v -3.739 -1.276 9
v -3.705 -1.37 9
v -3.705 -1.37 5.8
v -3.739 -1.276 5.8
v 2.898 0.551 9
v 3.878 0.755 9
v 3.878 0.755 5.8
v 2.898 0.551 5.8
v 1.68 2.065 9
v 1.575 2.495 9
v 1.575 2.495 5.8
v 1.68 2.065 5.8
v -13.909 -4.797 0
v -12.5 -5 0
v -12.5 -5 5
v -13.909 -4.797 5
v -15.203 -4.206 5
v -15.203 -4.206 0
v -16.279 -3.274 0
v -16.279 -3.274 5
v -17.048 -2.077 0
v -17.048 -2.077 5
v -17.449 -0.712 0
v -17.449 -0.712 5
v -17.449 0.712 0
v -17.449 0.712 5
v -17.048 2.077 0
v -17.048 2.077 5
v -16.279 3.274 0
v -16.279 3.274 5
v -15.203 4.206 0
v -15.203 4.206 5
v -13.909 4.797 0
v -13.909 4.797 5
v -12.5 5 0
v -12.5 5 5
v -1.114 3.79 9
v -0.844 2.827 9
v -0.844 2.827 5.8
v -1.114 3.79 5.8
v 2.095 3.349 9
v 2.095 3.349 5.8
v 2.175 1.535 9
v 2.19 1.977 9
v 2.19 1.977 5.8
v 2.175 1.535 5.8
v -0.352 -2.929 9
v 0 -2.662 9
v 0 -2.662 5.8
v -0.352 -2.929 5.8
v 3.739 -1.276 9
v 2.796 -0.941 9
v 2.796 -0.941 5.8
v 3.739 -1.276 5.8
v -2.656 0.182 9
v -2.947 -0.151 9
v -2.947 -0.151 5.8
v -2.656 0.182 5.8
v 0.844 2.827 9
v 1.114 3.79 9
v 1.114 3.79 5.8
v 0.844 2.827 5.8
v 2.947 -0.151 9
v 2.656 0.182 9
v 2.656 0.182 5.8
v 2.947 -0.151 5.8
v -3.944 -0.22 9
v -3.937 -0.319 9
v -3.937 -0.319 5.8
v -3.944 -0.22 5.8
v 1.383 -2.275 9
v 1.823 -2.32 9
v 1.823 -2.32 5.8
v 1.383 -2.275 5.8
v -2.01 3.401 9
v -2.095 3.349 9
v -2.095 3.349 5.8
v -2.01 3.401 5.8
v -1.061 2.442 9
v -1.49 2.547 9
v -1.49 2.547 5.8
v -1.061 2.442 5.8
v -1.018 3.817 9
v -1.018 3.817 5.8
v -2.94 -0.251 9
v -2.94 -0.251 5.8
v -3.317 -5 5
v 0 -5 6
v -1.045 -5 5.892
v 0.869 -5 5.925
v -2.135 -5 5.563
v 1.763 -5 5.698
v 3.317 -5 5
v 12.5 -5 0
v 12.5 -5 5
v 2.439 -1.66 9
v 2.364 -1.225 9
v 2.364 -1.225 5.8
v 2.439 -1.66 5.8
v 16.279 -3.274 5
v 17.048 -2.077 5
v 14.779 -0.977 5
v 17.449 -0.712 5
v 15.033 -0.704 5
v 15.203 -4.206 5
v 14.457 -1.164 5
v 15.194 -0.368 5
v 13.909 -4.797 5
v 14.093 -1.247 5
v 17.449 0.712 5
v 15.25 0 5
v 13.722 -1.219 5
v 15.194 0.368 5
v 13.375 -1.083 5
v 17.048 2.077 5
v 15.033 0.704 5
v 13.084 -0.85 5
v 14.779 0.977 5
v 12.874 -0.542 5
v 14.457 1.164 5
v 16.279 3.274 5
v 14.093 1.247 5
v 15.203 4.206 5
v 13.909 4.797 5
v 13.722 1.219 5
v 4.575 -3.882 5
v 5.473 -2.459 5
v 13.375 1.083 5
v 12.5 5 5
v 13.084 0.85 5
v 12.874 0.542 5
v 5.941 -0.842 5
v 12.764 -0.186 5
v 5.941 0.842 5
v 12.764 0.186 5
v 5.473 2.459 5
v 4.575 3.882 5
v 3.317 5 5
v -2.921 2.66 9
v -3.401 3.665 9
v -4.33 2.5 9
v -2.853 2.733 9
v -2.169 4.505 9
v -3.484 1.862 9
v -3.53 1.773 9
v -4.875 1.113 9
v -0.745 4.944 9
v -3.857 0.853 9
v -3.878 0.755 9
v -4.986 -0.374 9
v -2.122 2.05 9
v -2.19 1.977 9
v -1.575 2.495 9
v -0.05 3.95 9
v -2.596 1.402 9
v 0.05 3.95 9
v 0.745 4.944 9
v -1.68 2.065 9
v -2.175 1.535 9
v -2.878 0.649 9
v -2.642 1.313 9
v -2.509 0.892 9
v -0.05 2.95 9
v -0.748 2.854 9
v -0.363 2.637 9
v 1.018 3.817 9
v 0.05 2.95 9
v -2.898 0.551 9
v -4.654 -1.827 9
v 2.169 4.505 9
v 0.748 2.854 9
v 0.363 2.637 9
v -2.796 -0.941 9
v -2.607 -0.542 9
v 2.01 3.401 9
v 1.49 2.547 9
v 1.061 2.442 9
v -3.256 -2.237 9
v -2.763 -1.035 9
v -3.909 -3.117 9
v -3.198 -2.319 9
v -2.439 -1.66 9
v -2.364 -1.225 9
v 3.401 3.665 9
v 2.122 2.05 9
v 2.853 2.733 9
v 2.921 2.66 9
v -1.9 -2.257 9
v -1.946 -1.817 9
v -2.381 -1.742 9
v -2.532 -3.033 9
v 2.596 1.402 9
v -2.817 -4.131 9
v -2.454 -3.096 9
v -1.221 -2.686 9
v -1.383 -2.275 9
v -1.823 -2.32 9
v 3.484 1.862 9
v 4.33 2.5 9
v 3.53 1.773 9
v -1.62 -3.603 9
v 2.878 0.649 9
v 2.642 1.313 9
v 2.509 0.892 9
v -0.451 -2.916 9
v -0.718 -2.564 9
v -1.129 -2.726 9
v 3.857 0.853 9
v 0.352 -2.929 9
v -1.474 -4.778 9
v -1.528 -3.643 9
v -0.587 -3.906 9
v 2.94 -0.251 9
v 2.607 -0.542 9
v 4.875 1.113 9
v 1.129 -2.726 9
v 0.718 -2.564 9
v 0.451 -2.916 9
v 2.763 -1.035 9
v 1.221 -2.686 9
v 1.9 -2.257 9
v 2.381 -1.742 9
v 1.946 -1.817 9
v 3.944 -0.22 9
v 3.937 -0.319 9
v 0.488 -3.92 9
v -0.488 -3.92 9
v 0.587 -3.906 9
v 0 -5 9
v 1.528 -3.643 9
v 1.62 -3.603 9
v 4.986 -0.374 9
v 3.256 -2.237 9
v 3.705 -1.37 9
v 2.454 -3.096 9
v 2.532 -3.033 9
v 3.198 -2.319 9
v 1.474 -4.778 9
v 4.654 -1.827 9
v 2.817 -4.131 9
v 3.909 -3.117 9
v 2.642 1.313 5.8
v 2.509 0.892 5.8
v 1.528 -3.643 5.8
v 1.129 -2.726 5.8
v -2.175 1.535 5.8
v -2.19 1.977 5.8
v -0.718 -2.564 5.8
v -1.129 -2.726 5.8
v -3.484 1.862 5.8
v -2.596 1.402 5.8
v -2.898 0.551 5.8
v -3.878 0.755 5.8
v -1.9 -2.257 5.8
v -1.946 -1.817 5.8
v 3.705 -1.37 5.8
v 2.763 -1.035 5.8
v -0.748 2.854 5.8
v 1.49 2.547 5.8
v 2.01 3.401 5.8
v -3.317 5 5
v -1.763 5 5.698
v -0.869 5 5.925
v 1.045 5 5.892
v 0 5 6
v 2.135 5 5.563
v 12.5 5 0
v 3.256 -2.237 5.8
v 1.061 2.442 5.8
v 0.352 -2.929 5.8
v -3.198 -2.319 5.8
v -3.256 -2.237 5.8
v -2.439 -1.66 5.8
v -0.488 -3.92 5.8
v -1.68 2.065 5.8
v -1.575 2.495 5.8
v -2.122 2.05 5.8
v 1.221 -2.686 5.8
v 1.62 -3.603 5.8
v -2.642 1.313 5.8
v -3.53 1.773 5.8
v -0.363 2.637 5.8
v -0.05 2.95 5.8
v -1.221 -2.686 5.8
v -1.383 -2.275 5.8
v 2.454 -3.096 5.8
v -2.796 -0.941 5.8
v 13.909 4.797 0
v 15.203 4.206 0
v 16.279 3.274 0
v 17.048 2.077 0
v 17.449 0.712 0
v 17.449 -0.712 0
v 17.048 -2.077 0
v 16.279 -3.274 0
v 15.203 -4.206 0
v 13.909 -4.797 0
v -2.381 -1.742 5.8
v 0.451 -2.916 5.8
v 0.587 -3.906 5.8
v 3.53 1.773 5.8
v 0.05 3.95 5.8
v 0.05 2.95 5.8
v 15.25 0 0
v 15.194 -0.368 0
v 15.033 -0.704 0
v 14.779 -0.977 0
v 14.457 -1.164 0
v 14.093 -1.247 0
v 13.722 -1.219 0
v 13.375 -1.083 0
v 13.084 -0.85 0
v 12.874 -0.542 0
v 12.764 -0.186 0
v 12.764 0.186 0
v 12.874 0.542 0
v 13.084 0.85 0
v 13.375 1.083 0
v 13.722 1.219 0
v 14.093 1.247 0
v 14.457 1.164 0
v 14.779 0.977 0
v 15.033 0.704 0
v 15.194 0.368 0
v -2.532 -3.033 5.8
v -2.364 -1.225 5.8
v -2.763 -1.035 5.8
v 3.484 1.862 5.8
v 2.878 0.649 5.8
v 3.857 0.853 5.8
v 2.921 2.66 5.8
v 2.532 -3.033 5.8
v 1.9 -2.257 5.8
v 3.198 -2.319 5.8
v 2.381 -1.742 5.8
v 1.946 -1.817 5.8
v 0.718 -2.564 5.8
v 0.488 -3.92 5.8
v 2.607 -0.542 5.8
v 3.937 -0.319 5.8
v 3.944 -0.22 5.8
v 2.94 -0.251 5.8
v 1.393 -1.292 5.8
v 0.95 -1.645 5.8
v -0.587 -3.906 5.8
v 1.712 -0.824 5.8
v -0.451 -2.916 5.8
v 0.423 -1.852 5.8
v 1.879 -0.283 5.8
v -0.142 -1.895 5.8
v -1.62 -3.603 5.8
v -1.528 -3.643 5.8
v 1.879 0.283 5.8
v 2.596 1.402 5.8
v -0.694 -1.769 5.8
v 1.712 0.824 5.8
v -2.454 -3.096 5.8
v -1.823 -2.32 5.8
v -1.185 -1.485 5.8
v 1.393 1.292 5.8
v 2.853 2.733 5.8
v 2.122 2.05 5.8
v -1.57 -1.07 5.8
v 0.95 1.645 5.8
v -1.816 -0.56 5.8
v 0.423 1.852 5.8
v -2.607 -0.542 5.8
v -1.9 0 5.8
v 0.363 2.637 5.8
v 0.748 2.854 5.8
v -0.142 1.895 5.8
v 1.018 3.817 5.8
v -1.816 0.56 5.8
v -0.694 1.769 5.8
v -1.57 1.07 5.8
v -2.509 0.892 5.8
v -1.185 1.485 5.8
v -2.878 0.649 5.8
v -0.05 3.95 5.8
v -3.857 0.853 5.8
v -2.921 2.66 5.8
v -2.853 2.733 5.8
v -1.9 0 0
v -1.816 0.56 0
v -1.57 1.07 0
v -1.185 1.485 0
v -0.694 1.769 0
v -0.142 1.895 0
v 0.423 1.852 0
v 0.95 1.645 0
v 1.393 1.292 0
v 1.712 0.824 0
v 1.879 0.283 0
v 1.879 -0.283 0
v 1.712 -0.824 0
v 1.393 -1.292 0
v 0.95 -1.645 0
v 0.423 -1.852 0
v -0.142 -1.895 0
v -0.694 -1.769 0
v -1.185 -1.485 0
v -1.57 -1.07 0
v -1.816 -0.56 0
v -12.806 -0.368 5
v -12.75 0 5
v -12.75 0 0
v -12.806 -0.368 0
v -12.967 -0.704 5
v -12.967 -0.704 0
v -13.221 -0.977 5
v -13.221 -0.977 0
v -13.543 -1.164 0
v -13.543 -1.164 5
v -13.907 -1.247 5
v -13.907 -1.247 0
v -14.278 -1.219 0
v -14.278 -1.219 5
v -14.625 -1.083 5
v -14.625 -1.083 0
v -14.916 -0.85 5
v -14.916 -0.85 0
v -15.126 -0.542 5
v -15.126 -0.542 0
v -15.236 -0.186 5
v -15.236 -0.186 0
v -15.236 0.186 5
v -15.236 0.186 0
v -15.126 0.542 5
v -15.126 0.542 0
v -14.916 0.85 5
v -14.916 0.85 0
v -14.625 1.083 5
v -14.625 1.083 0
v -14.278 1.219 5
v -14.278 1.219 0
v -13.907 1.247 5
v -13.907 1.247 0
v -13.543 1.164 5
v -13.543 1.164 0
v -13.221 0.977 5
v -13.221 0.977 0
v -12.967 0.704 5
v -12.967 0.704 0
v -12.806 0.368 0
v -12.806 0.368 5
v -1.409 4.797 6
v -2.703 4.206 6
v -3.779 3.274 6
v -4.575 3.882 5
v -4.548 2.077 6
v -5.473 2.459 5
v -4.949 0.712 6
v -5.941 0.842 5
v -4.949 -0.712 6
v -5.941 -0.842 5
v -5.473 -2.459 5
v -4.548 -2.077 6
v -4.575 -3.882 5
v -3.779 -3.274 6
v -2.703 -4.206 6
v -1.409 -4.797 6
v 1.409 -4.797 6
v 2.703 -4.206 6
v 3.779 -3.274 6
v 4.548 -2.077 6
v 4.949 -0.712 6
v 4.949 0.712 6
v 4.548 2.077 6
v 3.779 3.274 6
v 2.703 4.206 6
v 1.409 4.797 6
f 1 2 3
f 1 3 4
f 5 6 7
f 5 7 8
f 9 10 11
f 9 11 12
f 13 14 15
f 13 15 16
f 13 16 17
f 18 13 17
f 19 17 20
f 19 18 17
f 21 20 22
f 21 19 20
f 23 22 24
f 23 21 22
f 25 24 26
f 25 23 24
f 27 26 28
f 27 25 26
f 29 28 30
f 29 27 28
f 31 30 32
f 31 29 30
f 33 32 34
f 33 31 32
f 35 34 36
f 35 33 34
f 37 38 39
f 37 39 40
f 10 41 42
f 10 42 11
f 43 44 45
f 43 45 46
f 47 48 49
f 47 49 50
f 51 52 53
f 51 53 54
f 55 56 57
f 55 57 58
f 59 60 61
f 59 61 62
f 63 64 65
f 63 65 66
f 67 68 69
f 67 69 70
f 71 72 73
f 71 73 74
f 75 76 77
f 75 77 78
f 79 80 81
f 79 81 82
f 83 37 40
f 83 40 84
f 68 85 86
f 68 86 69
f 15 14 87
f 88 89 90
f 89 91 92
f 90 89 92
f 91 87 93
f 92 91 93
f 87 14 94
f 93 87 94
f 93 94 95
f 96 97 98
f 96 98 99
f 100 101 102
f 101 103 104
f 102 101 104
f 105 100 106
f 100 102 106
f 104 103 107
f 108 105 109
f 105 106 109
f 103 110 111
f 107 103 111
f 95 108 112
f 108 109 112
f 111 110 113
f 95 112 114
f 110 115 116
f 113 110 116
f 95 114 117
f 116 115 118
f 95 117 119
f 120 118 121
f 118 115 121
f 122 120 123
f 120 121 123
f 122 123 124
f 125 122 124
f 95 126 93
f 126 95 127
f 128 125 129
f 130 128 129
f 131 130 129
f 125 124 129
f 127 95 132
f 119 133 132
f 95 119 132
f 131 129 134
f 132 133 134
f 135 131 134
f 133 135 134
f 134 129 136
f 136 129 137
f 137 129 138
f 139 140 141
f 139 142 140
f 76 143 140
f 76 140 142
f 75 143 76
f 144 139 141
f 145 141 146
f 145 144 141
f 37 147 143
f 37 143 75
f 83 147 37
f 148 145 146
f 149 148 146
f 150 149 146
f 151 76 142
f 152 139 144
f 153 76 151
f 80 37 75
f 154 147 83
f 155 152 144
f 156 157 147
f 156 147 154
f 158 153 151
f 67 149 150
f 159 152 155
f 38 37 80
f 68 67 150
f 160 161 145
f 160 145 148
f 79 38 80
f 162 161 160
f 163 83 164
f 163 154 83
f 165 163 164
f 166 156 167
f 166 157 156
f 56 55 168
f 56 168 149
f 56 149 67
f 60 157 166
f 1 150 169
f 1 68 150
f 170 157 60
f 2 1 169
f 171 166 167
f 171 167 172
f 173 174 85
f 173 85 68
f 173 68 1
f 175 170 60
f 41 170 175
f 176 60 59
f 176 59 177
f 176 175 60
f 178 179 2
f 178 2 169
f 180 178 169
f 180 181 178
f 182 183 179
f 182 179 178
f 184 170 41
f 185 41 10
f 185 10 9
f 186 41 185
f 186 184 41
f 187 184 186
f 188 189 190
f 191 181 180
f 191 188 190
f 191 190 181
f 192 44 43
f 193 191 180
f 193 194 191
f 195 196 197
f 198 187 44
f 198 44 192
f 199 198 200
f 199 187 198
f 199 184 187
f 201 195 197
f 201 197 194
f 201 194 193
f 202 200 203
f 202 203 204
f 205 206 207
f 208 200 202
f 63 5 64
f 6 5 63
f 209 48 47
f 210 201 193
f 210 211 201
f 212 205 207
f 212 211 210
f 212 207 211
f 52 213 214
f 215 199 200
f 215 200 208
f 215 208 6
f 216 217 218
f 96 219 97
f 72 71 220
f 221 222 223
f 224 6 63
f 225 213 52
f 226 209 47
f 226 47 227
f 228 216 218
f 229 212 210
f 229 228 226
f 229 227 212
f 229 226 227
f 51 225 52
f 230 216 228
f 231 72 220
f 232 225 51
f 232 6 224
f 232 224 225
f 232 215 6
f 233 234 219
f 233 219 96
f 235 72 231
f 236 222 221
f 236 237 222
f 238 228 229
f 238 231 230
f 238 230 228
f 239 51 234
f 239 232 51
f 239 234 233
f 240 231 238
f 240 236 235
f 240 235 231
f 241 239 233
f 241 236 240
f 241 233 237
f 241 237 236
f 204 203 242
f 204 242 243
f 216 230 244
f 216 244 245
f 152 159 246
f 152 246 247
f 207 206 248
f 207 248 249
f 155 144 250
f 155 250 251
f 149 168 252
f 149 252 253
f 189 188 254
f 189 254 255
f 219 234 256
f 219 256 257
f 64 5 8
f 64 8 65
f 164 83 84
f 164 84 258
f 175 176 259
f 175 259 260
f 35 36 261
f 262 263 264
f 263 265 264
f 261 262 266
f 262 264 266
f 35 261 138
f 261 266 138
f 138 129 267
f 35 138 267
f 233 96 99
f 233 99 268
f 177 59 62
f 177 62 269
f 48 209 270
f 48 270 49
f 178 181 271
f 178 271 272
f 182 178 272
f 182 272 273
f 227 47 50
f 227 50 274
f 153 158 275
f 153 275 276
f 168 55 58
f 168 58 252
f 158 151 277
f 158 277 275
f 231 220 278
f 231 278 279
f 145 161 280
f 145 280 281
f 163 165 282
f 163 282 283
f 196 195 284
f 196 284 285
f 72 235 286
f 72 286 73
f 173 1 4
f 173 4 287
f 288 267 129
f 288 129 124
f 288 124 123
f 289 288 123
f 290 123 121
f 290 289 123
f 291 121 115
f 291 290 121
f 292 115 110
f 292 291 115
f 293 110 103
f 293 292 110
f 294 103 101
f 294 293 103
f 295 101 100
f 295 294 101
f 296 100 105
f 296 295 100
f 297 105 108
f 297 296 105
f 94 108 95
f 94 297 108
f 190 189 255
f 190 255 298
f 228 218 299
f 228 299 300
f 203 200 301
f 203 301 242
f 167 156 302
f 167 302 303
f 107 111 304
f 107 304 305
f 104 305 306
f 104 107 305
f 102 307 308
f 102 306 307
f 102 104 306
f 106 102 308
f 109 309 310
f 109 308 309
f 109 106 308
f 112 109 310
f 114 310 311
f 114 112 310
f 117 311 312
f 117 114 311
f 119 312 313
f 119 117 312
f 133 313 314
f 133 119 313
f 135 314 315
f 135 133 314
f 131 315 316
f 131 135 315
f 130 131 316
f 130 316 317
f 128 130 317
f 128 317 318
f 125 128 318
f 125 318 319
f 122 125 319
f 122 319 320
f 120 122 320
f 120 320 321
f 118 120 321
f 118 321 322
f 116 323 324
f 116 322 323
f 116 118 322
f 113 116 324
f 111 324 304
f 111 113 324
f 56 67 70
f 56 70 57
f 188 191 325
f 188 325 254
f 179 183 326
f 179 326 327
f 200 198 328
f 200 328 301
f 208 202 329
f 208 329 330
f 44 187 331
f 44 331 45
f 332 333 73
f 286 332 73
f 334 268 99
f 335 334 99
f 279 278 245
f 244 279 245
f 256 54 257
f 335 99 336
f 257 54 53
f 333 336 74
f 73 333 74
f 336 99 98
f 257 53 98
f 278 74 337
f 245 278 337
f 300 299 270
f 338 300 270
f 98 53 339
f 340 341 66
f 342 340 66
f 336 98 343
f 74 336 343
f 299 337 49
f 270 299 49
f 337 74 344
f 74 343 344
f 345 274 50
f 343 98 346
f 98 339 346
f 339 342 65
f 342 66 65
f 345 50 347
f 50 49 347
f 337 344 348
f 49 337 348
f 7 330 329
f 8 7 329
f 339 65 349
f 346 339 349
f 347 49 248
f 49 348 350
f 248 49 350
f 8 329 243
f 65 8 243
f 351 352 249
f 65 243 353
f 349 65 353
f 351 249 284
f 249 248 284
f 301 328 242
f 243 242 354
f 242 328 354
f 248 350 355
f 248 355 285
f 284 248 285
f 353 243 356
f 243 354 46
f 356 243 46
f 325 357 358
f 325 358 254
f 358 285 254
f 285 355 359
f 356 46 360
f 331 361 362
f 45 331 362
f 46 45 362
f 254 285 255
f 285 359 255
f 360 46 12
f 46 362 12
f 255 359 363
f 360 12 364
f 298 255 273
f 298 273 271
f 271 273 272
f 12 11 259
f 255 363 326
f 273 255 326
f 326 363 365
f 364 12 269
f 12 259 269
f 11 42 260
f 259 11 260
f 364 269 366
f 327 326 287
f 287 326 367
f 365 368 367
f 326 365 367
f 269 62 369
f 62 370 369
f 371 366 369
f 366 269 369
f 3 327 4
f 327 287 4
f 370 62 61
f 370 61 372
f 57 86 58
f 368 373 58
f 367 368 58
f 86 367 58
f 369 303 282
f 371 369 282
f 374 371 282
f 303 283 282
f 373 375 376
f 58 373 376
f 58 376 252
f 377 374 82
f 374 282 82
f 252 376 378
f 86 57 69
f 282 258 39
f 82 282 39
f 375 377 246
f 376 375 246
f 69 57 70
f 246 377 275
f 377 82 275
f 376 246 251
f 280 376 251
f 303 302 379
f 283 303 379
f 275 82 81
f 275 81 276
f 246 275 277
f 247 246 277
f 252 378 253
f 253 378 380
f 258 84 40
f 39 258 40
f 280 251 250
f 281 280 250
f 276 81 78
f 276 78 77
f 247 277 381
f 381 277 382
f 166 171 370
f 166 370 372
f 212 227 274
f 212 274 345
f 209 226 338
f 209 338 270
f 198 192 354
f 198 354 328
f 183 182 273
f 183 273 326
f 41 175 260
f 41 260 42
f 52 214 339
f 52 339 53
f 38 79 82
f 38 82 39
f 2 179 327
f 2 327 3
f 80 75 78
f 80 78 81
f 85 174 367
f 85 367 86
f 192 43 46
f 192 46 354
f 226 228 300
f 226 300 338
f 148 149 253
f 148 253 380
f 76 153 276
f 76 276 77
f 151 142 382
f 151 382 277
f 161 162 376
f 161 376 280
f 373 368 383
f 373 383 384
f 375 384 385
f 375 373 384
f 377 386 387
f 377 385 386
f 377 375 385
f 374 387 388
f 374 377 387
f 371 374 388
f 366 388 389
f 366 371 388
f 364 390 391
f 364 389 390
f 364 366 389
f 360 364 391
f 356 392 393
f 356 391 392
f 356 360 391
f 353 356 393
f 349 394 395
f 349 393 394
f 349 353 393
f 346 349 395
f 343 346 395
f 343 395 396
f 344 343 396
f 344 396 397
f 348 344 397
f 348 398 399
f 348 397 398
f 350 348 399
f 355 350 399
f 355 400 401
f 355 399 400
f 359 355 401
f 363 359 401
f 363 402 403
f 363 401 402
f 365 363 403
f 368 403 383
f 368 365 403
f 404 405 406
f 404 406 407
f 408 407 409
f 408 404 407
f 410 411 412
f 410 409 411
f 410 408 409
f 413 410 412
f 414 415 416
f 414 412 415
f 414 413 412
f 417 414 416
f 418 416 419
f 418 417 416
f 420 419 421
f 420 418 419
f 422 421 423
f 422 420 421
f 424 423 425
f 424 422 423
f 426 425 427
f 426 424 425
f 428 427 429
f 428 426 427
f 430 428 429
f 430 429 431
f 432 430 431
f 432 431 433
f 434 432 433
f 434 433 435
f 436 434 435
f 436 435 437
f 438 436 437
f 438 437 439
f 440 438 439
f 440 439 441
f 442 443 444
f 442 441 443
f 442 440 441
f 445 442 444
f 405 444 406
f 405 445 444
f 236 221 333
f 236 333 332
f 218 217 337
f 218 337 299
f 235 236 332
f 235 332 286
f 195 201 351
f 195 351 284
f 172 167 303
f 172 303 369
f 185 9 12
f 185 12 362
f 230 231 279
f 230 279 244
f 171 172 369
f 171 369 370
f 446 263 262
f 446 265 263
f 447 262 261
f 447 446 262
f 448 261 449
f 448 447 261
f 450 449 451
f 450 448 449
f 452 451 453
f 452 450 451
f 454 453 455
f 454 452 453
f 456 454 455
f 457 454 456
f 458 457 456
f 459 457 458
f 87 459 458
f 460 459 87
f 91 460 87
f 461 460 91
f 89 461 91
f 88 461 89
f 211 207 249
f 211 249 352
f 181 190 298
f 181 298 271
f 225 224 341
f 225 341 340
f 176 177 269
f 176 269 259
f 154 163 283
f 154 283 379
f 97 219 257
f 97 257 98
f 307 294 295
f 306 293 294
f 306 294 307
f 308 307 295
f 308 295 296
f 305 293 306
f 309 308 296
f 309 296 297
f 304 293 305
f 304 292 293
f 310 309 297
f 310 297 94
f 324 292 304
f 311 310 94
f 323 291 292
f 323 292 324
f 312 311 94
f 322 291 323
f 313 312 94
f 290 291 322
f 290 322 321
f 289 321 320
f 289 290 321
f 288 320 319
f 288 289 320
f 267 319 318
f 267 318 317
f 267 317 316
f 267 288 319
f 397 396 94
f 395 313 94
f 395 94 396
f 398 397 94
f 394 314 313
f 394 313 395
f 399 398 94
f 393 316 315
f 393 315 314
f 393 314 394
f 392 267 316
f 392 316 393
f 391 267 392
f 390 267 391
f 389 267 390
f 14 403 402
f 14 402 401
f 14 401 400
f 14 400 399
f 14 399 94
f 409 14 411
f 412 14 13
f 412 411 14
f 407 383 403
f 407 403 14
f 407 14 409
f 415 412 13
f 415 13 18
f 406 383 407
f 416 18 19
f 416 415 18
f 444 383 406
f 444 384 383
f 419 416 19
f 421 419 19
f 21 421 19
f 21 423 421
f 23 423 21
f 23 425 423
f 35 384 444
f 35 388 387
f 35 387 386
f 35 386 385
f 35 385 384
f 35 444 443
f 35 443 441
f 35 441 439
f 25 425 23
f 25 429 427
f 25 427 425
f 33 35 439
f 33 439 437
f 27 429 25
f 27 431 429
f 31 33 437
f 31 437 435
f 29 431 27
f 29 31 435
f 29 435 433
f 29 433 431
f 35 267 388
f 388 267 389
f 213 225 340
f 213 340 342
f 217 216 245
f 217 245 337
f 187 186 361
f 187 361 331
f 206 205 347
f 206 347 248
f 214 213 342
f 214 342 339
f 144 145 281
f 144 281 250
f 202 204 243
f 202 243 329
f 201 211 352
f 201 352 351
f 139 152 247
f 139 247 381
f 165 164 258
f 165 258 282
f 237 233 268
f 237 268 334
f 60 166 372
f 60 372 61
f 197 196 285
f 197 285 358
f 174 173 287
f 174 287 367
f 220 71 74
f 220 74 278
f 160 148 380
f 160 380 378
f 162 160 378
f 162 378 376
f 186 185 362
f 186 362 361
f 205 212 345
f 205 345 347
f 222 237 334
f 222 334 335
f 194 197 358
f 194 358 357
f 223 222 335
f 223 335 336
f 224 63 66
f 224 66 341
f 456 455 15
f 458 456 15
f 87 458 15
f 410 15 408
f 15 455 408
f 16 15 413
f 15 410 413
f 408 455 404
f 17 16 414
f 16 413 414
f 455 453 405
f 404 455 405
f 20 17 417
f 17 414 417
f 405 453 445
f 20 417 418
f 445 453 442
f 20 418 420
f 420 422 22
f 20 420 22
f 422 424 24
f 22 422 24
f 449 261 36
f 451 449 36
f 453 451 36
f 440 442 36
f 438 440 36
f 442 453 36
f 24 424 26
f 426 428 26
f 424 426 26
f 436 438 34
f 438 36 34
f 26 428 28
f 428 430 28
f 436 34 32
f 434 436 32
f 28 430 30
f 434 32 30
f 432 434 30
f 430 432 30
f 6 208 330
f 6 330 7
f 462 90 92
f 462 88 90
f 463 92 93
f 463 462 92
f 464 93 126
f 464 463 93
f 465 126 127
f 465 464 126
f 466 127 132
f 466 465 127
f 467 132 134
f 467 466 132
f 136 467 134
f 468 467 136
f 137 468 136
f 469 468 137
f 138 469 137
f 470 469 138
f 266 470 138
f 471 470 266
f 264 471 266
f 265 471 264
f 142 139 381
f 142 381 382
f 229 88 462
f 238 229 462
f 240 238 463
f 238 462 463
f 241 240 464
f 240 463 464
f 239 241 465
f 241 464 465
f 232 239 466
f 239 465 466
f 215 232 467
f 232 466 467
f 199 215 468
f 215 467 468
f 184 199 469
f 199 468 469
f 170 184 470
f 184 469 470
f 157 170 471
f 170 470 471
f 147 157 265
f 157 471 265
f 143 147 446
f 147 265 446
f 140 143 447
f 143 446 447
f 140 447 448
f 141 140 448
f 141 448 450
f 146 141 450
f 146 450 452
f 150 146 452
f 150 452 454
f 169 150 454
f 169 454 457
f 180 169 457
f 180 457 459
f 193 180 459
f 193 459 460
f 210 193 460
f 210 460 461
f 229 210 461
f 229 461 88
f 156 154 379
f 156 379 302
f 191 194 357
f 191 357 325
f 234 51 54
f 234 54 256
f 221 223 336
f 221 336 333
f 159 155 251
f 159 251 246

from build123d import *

# Parameters (mm, degrees)
EXTRUDE_1_DEPTH          = 5
SKETCH_6_R               = 5
EXTRUDE_3_DEPTH          = 4
CUT_EXTRUDE_5_DEPTH      = 3.2
CHAMFER_1_SIZE           = 1
CUT_EXTRUDE_6_DEPTH      = 21.303940504
CUT_EXTRUDE_6_DEPTH_BACK = 21.303940504
SKETCH_7_R               = 1.25
SKETCH_7_R_2             = 1.9


with BuildPart() as part:
    # ｽｹｯﾁ1 → ﾎﾞｽ - 押し出し1 (new body)
    with BuildSketch(Plane.XY):
        with BuildLine():
            Line((12.5, -5), (-12.5, -5))
            ThreePointArc((-12.5, -5), (-17.5, 0), (-12.5, 5))
            Line((-12.5, 5), (12.5, 5))
            ThreePointArc((12.5, 5), (17.5, 0), (12.5, -5))
        make_face()
    extrude(amount=EXTRUDE_1_DEPTH)

    # ｽｹｯﾁ6 → ﾎﾞｽ - 押し出し3 (add)
    with BuildSketch(Plane.XY.offset(5)):
        with Locations(Location((0, 0, 0), (0, 0, 270))):
            Circle(SKETCH_6_R)
    extrude(amount=EXTRUDE_3_DEPTH)

    # ｽｹｯﾁ5 → ｶｯﾄ - 押し出し5 (cut)
    with BuildSketch(Plane.XY.offset(9)):
        Polygon((-0.05, 2.95), (-0.05, 3.95), (0.05, 3.95), (0.05, 2.95), (0.362514094, 2.637485906), (0.747754611, 2.854095836), (1.017551382, 3.817013124), (1.11384311, 3.790033446), (0.844046339, 2.827116159), (1.060656269, 2.441875642), (1.490051682, 2.546516441), (2.009635632, 3.400935845), (2.095077573, 3.34897745), (1.575493623, 2.494558046), (1.680134421, 2.065162633), (2.121838437, 2.050073571), (2.852674402, 2.732626714), (2.920929716, 2.659543117), (2.190093752, 1.976989974), (2.17500469, 1.535285958), (2.596258142, 1.401586122), (3.484143361, 1.86165116), (3.530149865, 1.772862638), (2.642264646, 1.3127976), (2.50856481, 0.891544148), (2.878125258, 0.649149443), (3.857209346, 0.852605456), (3.877554947, 0.754697047), (2.898470859, 0.551241034), (2.656076155, 0.181680586), (2.94653499, -0.151431681), (3.944203759, -0.219674094), (3.937379518, -0.319440971), (2.939710748, -0.251198558), (2.606598481, -0.541657393), (2.796413701, -0.94078181), (3.738674623, -1.275661422), (3.705186662, -1.369887514), (2.76292574, -1.035007902), (2.363801323, -1.224823122), (2.4388952, -1.660358456), (3.255865093, -2.237038778), (3.198197061, -2.318735767), (2.381227168, -1.742055445), (1.945691834, -1.817149322), (1.900495, -2.25679391), (2.531582945, -3.032505201), (2.454011816, -3.095613995), (1.822923871, -2.319902705), (1.383279283, -2.274705871), (1.22114378, -2.685853285), (1.61954487, -3.603064586), (1.52782374, -3.642904695), (1.12942265, -2.725693394), (0.718275236, -2.563557891), (0.451225912, -2.915715208), (0.587392561, -3.906401154), (0.488323967, -3.920017819), (0.352157318, -2.929331873), (0, -2.66228255), (-0.352157318, -2.929331873), (-0.488323967, -3.920017819), (-0.587392561, -3.906401154), (-0.451225912, -2.915715208), (-0.718275236, -2.563557891), (-1.12942265, -2.725693394), (-1.52782374, -3.642904695), (-1.61954487, -3.603064586), (-1.22114378, -2.685853285), (-1.383279283, -2.274705871), (-1.822923871, -2.319902705), (-2.454011816, -3.095613995), (-2.531582945, -3.032505201), (-1.900495, -2.25679391), (-1.945691834, -1.817149322), (-2.381227168, -1.742055445), (-3.198197061, -2.318735767), (-3.255865093, -2.237038778), (-2.4388952, -1.660358456), (-2.363801323, -1.224823122), (-2.76292574, -1.035007902), (-3.705186662, -1.369887514), (-3.738674623, -1.275661422), (-2.796413701, -0.94078181), (-2.606598481, -0.541657393), (-2.939710748, -0.251198558), (-3.937379518, -0.319440971), (-3.944203759, -0.219674094), (-2.94653499, -0.151431681), (-2.656076155, 0.181680586), (-2.898470859, 0.551241034), (-3.877554947, 0.754697047), (-3.857209346, 0.852605456), (-2.878125258, 0.649149443), (-2.50856481, 0.891544148), (-2.642264646, 1.3127976), (-3.530149865, 1.772862638), (-3.484143361, 1.86165116), (-2.596258142, 1.401586122), (-2.17500469, 1.535285958), (-2.190093752, 1.976989974), (-2.920929716, 2.659543117), (-2.852674402, 2.732626714), (-2.121838437, 2.050073571), (-1.680134421, 2.065162633), (-1.575493623, 2.494558046), (-2.095077573, 3.34897745), (-2.009635632, 3.400935845), (-1.490051682, 2.546516441), (-1.060656269, 2.441875642), (-0.844046339, 2.827116159), (-1.11384311, 3.790033446), (-1.017551382, 3.817013124), (-0.747754611, 2.854095836), (-0.362514094, 2.637485906), align=None)
    extrude(amount=-CUT_EXTRUDE_5_DEPTH, mode=Mode.SUBTRACT)

    # 面取り1
    # the kernel refuses this chamfer: 1 mm, written as the material it adds along each edge
    with BuildSketch(Plane(origin=(0, 0, 5), x_dir=(0, -1, 0), z_dir=(-1, 0, 0))) as chamfer_1_piece_1_section:
        Polygon((5 + CHAMFER_1_SIZE, 0), (5, CHAMFER_1_SIZE), (5, 0), align=None)
    chamfer_1_piece_1 = revolve(axis=Axis((0, 0, 5), (0, 0, 1)), revolution_arc=180, mode=Mode.PRIVATE)
    chamfer_1_piece_1 = split(chamfer_1_piece_1, bisect_by=Plane(origin=(5.48673026, -5, 5.48673026), z_dir=(0, 1, 0)), keep=Keep.TOP, mode=Mode.PRIVATE)
    chamfer_1_piece_1 = split(chamfer_1_piece_1, bisect_by=Plane(origin=(5.48673026, 5, 5.48673026), z_dir=(0, -1, 0)), keep=Keep.TOP, mode=Mode.PRIVATE)
    add(chamfer_1_piece_1)
    with BuildSketch(Plane(origin=(0, 0, 5), x_dir=(0, 1, 0), z_dir=(1, 0, 0))) as chamfer_1_piece_2_section:
        Polygon((5 + CHAMFER_1_SIZE, 0), (5, CHAMFER_1_SIZE), (5, 0), align=None)
    chamfer_1_piece_2 = revolve(axis=Axis((0, 0, 5), (0, 0, 1)), revolution_arc=180, mode=Mode.PRIVATE)
    chamfer_1_piece_2 = split(chamfer_1_piece_2, bisect_by=Plane(origin=(-5.48673026, -5, 5.48673026), z_dir=(0, 1, 0)), keep=Keep.TOP, mode=Mode.PRIVATE)
    chamfer_1_piece_2 = split(chamfer_1_piece_2, bisect_by=Plane(origin=(-5.48673026, 5, 5.48673026), z_dir=(0, -1, 0)), keep=Keep.TOP, mode=Mode.PRIVATE)
    add(chamfer_1_piece_2)

    # ｽｹｯﾁ7 → ｶｯﾄ - 押し出し6 (cut, two sides: drawn at the far end of the back side and taken through both)
    with BuildSketch(Plane(origin=(0, 0, 0), x_dir=(-1, 0, 0), z_dir=(0, 0, -1)).offset(-CUT_EXTRUDE_6_DEPTH_BACK)):
        with Locations(Location((14, 0, 0), (0, 0, 180))):
            Circle(SKETCH_7_R)
        Circle(SKETCH_7_R_2)
        with Locations(Location((-14, 0, 0), (0, 0, 180))):
            Circle(SKETCH_7_R)
    extrude(amount=CUT_EXTRUDE_6_DEPTH + CUT_EXTRUDE_6_DEPTH_BACK, mode=Mode.SUBTRACT)


solid = part.part
